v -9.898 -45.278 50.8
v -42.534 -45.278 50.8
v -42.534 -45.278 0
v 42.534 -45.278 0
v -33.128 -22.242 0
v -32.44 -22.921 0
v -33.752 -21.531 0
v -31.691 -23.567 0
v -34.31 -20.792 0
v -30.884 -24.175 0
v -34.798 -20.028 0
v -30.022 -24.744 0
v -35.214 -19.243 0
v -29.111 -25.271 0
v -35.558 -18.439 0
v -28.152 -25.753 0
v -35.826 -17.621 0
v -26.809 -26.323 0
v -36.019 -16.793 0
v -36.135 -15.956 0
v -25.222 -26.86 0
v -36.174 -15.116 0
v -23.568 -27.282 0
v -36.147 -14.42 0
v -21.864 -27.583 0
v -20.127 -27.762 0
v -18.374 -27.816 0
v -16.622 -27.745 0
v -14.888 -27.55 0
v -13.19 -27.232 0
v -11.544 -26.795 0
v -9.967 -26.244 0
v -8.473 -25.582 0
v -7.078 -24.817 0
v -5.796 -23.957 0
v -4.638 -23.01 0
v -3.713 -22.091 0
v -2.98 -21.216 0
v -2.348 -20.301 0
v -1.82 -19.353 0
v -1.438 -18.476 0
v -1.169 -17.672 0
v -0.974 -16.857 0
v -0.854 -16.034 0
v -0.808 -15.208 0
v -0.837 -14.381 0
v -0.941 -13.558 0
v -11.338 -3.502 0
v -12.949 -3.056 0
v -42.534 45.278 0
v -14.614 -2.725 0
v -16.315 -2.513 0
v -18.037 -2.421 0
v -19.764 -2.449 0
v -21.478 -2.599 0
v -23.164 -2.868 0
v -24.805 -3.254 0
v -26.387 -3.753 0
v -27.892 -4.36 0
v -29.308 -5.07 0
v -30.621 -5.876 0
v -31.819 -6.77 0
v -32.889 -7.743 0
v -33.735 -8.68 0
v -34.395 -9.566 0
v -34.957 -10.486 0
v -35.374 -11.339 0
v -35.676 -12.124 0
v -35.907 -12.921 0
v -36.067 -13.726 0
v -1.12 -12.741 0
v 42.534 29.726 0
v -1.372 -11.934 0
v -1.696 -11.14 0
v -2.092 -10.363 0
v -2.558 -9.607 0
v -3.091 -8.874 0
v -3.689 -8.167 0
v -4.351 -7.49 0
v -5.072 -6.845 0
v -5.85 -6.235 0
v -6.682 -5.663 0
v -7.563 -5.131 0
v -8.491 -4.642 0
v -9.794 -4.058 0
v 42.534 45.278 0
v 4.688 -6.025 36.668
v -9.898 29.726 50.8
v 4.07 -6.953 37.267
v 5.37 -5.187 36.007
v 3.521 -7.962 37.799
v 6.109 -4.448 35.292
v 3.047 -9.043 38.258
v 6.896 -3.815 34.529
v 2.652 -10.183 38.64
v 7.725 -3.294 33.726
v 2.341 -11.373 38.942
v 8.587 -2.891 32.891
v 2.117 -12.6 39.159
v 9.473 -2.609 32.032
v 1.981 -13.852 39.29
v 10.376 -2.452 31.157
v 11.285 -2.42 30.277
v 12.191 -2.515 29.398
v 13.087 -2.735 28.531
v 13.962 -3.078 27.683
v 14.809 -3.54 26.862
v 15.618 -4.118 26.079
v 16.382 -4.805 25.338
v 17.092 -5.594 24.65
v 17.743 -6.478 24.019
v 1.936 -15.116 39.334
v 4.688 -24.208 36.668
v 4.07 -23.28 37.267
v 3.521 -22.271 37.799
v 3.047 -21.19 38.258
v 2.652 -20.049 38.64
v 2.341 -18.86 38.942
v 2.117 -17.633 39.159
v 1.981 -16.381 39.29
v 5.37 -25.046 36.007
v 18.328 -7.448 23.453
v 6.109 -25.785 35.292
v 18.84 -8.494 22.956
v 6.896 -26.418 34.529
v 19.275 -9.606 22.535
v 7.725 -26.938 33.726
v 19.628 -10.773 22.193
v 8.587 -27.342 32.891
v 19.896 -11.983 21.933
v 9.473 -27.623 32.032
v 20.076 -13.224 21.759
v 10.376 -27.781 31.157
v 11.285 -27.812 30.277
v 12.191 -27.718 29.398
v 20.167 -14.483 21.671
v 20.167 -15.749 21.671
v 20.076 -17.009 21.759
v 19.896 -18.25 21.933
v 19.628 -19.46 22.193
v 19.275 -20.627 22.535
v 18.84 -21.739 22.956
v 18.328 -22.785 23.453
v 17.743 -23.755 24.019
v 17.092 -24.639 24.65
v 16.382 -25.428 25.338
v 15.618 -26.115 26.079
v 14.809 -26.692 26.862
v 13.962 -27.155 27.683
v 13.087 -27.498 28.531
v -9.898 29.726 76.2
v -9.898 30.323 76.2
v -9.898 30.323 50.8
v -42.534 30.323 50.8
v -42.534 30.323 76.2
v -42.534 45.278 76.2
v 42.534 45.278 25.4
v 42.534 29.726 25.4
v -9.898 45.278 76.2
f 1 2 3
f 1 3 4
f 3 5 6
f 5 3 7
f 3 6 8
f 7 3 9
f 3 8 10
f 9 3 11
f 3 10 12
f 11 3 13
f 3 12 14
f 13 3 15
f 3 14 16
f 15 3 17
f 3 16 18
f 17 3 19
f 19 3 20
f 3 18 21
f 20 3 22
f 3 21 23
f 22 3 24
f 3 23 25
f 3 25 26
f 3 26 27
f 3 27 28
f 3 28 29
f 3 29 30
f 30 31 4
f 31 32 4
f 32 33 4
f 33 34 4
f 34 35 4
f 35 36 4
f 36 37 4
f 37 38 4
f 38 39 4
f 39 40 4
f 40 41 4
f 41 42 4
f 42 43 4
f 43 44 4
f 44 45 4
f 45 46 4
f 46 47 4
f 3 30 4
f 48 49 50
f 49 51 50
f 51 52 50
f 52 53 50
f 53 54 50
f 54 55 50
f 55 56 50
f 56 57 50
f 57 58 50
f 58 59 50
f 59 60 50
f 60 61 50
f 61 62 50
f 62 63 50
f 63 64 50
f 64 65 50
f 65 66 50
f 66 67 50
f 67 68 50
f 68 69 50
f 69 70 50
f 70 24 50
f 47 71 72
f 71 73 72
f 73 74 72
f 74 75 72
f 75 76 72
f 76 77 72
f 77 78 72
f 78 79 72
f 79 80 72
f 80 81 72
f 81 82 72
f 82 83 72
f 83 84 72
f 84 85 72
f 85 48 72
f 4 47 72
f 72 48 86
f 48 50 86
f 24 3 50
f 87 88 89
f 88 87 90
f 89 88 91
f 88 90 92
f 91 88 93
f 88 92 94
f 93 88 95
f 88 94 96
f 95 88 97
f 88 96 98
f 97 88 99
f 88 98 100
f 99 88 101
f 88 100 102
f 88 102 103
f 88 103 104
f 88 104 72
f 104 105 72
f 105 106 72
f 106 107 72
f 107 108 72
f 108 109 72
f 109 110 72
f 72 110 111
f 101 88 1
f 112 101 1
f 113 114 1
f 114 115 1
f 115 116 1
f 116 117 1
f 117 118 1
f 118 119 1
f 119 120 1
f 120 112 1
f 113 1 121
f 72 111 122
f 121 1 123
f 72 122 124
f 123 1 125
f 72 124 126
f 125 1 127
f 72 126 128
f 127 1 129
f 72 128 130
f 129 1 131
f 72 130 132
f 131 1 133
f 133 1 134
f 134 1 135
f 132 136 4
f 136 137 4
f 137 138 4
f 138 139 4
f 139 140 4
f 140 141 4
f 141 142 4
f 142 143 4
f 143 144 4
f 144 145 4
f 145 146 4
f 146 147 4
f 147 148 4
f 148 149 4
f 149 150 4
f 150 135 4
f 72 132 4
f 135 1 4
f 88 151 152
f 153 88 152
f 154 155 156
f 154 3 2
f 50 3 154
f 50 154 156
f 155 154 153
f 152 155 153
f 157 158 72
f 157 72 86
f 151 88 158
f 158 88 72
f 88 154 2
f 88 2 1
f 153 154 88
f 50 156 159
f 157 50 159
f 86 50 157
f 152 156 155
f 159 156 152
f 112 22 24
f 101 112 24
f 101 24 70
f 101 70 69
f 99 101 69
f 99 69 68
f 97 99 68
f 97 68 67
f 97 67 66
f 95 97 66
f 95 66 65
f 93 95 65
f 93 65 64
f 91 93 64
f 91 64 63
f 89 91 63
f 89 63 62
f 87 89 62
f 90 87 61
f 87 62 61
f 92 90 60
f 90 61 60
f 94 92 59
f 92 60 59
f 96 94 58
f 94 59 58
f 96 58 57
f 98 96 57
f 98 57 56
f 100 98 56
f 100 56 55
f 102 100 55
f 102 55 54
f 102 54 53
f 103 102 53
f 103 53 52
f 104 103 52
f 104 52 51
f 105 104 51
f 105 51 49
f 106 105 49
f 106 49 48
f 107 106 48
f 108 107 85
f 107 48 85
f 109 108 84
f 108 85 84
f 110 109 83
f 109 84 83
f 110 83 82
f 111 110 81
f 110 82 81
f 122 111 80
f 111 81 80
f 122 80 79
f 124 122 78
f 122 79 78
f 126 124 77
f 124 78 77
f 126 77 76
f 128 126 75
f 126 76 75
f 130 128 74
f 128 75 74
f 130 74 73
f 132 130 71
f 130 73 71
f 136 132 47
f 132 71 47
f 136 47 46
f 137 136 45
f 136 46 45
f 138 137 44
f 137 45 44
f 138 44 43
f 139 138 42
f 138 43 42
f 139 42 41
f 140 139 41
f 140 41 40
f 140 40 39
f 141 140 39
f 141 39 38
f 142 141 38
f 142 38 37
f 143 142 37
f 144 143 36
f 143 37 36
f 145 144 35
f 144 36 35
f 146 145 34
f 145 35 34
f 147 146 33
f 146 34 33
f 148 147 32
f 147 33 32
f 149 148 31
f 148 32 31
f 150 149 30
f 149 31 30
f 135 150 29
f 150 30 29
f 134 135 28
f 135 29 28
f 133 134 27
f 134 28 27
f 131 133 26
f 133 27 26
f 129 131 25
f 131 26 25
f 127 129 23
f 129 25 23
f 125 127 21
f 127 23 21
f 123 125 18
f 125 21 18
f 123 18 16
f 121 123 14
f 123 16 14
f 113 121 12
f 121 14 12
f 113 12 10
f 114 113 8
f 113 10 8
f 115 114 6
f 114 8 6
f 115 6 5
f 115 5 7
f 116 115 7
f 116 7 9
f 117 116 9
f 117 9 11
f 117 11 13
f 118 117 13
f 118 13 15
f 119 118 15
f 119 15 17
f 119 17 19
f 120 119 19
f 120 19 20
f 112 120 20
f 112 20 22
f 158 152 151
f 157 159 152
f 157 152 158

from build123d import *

# Parameters (mm, degrees)
F0_W     = 85.0682780147
F0_H     = 90.5551686883
F1_DEPTH = 50.8
F3_DEPTH = 90.5561686883
F5_D     = 25.4
F7_W     = 32.6359942555
F7_H     = 14.9547737092
F6_W     = 73.0053722694
F6_H     = 15.5514590442
F8_DEPTH = 25.4


with BuildPart() as f1:
    # F0 (on Top) → F1 (new body)
    with BuildSketch(Plane.XY):
        Rectangle(F0_W, F0_H)
    extrude(amount=F1_DEPTH)

    # F2 (on face) → F3 (cut, through all)
    with BuildSketch(Plane.XZ.offset(45.2775843441)):
        Polygon((42.5341390073, 0), (42.5341390073, 50.8), (-9.8981447518, 50.8), align=None)
    extrude(amount=-F3_DEPTH, mode=Mode.SUBTRACT)

    # F5 (through all)
    with Locations(Plane(origin=(20.594698145, 0, 21.2564381313), x_dir=(0.7181976083, 0, -0.6958392023), z_dir=(0.6958392023, 0, 0.7181976083))):
        with Locations((-13.2798599079, -15.1163674891)):
            Hole(F5_D / 2)

    # F7 (on face) + F6 (on face) → F8 (join)
    with BuildSketch(Plane.XY.offset(50.8)):
        with Locations((-26.2161418796, 37.8001974896)):
            Rectangle(F7_W, F7_H)
    with BuildSketch(Plane(origin=(20.594698145, 0, 21.2564381313), x_dir=(0.7181976083, 0, -0.6958392023), z_dir=(0.6958392023, 0, 0.7181976083))):
        with Locations((-5.9547692273, 37.501854822)):
            Rectangle(F6_W, F6_H)
    extrude(amount=F8_DEPTH, dir=(0, 0, 1))


solid = f1.part
